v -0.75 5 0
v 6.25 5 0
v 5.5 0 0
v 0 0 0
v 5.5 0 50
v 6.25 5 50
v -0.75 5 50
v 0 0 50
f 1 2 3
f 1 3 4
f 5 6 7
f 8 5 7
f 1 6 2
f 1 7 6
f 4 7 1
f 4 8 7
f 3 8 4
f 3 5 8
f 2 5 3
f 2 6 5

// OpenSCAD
// Definition size of housing
// **************************

intdia      = 60;    
lensdia      = 30;     
height     = 19;
recess     = 2.4;
wall        = 2;
overlap = 50;

radius     = 1.2;            
act_x      = 2.4;
act_y      = 2.4;
act_z      = 4;

act_clip_w=1;

//Definition of circle angular resolution
resol        = 64;           // Identical to housing !!!

union (){
difference () {
    linear_extrude(50) polygon(points=[[0,0],[5.5,0],[6.25,5],[-0.75,5]]);
    
};


};
